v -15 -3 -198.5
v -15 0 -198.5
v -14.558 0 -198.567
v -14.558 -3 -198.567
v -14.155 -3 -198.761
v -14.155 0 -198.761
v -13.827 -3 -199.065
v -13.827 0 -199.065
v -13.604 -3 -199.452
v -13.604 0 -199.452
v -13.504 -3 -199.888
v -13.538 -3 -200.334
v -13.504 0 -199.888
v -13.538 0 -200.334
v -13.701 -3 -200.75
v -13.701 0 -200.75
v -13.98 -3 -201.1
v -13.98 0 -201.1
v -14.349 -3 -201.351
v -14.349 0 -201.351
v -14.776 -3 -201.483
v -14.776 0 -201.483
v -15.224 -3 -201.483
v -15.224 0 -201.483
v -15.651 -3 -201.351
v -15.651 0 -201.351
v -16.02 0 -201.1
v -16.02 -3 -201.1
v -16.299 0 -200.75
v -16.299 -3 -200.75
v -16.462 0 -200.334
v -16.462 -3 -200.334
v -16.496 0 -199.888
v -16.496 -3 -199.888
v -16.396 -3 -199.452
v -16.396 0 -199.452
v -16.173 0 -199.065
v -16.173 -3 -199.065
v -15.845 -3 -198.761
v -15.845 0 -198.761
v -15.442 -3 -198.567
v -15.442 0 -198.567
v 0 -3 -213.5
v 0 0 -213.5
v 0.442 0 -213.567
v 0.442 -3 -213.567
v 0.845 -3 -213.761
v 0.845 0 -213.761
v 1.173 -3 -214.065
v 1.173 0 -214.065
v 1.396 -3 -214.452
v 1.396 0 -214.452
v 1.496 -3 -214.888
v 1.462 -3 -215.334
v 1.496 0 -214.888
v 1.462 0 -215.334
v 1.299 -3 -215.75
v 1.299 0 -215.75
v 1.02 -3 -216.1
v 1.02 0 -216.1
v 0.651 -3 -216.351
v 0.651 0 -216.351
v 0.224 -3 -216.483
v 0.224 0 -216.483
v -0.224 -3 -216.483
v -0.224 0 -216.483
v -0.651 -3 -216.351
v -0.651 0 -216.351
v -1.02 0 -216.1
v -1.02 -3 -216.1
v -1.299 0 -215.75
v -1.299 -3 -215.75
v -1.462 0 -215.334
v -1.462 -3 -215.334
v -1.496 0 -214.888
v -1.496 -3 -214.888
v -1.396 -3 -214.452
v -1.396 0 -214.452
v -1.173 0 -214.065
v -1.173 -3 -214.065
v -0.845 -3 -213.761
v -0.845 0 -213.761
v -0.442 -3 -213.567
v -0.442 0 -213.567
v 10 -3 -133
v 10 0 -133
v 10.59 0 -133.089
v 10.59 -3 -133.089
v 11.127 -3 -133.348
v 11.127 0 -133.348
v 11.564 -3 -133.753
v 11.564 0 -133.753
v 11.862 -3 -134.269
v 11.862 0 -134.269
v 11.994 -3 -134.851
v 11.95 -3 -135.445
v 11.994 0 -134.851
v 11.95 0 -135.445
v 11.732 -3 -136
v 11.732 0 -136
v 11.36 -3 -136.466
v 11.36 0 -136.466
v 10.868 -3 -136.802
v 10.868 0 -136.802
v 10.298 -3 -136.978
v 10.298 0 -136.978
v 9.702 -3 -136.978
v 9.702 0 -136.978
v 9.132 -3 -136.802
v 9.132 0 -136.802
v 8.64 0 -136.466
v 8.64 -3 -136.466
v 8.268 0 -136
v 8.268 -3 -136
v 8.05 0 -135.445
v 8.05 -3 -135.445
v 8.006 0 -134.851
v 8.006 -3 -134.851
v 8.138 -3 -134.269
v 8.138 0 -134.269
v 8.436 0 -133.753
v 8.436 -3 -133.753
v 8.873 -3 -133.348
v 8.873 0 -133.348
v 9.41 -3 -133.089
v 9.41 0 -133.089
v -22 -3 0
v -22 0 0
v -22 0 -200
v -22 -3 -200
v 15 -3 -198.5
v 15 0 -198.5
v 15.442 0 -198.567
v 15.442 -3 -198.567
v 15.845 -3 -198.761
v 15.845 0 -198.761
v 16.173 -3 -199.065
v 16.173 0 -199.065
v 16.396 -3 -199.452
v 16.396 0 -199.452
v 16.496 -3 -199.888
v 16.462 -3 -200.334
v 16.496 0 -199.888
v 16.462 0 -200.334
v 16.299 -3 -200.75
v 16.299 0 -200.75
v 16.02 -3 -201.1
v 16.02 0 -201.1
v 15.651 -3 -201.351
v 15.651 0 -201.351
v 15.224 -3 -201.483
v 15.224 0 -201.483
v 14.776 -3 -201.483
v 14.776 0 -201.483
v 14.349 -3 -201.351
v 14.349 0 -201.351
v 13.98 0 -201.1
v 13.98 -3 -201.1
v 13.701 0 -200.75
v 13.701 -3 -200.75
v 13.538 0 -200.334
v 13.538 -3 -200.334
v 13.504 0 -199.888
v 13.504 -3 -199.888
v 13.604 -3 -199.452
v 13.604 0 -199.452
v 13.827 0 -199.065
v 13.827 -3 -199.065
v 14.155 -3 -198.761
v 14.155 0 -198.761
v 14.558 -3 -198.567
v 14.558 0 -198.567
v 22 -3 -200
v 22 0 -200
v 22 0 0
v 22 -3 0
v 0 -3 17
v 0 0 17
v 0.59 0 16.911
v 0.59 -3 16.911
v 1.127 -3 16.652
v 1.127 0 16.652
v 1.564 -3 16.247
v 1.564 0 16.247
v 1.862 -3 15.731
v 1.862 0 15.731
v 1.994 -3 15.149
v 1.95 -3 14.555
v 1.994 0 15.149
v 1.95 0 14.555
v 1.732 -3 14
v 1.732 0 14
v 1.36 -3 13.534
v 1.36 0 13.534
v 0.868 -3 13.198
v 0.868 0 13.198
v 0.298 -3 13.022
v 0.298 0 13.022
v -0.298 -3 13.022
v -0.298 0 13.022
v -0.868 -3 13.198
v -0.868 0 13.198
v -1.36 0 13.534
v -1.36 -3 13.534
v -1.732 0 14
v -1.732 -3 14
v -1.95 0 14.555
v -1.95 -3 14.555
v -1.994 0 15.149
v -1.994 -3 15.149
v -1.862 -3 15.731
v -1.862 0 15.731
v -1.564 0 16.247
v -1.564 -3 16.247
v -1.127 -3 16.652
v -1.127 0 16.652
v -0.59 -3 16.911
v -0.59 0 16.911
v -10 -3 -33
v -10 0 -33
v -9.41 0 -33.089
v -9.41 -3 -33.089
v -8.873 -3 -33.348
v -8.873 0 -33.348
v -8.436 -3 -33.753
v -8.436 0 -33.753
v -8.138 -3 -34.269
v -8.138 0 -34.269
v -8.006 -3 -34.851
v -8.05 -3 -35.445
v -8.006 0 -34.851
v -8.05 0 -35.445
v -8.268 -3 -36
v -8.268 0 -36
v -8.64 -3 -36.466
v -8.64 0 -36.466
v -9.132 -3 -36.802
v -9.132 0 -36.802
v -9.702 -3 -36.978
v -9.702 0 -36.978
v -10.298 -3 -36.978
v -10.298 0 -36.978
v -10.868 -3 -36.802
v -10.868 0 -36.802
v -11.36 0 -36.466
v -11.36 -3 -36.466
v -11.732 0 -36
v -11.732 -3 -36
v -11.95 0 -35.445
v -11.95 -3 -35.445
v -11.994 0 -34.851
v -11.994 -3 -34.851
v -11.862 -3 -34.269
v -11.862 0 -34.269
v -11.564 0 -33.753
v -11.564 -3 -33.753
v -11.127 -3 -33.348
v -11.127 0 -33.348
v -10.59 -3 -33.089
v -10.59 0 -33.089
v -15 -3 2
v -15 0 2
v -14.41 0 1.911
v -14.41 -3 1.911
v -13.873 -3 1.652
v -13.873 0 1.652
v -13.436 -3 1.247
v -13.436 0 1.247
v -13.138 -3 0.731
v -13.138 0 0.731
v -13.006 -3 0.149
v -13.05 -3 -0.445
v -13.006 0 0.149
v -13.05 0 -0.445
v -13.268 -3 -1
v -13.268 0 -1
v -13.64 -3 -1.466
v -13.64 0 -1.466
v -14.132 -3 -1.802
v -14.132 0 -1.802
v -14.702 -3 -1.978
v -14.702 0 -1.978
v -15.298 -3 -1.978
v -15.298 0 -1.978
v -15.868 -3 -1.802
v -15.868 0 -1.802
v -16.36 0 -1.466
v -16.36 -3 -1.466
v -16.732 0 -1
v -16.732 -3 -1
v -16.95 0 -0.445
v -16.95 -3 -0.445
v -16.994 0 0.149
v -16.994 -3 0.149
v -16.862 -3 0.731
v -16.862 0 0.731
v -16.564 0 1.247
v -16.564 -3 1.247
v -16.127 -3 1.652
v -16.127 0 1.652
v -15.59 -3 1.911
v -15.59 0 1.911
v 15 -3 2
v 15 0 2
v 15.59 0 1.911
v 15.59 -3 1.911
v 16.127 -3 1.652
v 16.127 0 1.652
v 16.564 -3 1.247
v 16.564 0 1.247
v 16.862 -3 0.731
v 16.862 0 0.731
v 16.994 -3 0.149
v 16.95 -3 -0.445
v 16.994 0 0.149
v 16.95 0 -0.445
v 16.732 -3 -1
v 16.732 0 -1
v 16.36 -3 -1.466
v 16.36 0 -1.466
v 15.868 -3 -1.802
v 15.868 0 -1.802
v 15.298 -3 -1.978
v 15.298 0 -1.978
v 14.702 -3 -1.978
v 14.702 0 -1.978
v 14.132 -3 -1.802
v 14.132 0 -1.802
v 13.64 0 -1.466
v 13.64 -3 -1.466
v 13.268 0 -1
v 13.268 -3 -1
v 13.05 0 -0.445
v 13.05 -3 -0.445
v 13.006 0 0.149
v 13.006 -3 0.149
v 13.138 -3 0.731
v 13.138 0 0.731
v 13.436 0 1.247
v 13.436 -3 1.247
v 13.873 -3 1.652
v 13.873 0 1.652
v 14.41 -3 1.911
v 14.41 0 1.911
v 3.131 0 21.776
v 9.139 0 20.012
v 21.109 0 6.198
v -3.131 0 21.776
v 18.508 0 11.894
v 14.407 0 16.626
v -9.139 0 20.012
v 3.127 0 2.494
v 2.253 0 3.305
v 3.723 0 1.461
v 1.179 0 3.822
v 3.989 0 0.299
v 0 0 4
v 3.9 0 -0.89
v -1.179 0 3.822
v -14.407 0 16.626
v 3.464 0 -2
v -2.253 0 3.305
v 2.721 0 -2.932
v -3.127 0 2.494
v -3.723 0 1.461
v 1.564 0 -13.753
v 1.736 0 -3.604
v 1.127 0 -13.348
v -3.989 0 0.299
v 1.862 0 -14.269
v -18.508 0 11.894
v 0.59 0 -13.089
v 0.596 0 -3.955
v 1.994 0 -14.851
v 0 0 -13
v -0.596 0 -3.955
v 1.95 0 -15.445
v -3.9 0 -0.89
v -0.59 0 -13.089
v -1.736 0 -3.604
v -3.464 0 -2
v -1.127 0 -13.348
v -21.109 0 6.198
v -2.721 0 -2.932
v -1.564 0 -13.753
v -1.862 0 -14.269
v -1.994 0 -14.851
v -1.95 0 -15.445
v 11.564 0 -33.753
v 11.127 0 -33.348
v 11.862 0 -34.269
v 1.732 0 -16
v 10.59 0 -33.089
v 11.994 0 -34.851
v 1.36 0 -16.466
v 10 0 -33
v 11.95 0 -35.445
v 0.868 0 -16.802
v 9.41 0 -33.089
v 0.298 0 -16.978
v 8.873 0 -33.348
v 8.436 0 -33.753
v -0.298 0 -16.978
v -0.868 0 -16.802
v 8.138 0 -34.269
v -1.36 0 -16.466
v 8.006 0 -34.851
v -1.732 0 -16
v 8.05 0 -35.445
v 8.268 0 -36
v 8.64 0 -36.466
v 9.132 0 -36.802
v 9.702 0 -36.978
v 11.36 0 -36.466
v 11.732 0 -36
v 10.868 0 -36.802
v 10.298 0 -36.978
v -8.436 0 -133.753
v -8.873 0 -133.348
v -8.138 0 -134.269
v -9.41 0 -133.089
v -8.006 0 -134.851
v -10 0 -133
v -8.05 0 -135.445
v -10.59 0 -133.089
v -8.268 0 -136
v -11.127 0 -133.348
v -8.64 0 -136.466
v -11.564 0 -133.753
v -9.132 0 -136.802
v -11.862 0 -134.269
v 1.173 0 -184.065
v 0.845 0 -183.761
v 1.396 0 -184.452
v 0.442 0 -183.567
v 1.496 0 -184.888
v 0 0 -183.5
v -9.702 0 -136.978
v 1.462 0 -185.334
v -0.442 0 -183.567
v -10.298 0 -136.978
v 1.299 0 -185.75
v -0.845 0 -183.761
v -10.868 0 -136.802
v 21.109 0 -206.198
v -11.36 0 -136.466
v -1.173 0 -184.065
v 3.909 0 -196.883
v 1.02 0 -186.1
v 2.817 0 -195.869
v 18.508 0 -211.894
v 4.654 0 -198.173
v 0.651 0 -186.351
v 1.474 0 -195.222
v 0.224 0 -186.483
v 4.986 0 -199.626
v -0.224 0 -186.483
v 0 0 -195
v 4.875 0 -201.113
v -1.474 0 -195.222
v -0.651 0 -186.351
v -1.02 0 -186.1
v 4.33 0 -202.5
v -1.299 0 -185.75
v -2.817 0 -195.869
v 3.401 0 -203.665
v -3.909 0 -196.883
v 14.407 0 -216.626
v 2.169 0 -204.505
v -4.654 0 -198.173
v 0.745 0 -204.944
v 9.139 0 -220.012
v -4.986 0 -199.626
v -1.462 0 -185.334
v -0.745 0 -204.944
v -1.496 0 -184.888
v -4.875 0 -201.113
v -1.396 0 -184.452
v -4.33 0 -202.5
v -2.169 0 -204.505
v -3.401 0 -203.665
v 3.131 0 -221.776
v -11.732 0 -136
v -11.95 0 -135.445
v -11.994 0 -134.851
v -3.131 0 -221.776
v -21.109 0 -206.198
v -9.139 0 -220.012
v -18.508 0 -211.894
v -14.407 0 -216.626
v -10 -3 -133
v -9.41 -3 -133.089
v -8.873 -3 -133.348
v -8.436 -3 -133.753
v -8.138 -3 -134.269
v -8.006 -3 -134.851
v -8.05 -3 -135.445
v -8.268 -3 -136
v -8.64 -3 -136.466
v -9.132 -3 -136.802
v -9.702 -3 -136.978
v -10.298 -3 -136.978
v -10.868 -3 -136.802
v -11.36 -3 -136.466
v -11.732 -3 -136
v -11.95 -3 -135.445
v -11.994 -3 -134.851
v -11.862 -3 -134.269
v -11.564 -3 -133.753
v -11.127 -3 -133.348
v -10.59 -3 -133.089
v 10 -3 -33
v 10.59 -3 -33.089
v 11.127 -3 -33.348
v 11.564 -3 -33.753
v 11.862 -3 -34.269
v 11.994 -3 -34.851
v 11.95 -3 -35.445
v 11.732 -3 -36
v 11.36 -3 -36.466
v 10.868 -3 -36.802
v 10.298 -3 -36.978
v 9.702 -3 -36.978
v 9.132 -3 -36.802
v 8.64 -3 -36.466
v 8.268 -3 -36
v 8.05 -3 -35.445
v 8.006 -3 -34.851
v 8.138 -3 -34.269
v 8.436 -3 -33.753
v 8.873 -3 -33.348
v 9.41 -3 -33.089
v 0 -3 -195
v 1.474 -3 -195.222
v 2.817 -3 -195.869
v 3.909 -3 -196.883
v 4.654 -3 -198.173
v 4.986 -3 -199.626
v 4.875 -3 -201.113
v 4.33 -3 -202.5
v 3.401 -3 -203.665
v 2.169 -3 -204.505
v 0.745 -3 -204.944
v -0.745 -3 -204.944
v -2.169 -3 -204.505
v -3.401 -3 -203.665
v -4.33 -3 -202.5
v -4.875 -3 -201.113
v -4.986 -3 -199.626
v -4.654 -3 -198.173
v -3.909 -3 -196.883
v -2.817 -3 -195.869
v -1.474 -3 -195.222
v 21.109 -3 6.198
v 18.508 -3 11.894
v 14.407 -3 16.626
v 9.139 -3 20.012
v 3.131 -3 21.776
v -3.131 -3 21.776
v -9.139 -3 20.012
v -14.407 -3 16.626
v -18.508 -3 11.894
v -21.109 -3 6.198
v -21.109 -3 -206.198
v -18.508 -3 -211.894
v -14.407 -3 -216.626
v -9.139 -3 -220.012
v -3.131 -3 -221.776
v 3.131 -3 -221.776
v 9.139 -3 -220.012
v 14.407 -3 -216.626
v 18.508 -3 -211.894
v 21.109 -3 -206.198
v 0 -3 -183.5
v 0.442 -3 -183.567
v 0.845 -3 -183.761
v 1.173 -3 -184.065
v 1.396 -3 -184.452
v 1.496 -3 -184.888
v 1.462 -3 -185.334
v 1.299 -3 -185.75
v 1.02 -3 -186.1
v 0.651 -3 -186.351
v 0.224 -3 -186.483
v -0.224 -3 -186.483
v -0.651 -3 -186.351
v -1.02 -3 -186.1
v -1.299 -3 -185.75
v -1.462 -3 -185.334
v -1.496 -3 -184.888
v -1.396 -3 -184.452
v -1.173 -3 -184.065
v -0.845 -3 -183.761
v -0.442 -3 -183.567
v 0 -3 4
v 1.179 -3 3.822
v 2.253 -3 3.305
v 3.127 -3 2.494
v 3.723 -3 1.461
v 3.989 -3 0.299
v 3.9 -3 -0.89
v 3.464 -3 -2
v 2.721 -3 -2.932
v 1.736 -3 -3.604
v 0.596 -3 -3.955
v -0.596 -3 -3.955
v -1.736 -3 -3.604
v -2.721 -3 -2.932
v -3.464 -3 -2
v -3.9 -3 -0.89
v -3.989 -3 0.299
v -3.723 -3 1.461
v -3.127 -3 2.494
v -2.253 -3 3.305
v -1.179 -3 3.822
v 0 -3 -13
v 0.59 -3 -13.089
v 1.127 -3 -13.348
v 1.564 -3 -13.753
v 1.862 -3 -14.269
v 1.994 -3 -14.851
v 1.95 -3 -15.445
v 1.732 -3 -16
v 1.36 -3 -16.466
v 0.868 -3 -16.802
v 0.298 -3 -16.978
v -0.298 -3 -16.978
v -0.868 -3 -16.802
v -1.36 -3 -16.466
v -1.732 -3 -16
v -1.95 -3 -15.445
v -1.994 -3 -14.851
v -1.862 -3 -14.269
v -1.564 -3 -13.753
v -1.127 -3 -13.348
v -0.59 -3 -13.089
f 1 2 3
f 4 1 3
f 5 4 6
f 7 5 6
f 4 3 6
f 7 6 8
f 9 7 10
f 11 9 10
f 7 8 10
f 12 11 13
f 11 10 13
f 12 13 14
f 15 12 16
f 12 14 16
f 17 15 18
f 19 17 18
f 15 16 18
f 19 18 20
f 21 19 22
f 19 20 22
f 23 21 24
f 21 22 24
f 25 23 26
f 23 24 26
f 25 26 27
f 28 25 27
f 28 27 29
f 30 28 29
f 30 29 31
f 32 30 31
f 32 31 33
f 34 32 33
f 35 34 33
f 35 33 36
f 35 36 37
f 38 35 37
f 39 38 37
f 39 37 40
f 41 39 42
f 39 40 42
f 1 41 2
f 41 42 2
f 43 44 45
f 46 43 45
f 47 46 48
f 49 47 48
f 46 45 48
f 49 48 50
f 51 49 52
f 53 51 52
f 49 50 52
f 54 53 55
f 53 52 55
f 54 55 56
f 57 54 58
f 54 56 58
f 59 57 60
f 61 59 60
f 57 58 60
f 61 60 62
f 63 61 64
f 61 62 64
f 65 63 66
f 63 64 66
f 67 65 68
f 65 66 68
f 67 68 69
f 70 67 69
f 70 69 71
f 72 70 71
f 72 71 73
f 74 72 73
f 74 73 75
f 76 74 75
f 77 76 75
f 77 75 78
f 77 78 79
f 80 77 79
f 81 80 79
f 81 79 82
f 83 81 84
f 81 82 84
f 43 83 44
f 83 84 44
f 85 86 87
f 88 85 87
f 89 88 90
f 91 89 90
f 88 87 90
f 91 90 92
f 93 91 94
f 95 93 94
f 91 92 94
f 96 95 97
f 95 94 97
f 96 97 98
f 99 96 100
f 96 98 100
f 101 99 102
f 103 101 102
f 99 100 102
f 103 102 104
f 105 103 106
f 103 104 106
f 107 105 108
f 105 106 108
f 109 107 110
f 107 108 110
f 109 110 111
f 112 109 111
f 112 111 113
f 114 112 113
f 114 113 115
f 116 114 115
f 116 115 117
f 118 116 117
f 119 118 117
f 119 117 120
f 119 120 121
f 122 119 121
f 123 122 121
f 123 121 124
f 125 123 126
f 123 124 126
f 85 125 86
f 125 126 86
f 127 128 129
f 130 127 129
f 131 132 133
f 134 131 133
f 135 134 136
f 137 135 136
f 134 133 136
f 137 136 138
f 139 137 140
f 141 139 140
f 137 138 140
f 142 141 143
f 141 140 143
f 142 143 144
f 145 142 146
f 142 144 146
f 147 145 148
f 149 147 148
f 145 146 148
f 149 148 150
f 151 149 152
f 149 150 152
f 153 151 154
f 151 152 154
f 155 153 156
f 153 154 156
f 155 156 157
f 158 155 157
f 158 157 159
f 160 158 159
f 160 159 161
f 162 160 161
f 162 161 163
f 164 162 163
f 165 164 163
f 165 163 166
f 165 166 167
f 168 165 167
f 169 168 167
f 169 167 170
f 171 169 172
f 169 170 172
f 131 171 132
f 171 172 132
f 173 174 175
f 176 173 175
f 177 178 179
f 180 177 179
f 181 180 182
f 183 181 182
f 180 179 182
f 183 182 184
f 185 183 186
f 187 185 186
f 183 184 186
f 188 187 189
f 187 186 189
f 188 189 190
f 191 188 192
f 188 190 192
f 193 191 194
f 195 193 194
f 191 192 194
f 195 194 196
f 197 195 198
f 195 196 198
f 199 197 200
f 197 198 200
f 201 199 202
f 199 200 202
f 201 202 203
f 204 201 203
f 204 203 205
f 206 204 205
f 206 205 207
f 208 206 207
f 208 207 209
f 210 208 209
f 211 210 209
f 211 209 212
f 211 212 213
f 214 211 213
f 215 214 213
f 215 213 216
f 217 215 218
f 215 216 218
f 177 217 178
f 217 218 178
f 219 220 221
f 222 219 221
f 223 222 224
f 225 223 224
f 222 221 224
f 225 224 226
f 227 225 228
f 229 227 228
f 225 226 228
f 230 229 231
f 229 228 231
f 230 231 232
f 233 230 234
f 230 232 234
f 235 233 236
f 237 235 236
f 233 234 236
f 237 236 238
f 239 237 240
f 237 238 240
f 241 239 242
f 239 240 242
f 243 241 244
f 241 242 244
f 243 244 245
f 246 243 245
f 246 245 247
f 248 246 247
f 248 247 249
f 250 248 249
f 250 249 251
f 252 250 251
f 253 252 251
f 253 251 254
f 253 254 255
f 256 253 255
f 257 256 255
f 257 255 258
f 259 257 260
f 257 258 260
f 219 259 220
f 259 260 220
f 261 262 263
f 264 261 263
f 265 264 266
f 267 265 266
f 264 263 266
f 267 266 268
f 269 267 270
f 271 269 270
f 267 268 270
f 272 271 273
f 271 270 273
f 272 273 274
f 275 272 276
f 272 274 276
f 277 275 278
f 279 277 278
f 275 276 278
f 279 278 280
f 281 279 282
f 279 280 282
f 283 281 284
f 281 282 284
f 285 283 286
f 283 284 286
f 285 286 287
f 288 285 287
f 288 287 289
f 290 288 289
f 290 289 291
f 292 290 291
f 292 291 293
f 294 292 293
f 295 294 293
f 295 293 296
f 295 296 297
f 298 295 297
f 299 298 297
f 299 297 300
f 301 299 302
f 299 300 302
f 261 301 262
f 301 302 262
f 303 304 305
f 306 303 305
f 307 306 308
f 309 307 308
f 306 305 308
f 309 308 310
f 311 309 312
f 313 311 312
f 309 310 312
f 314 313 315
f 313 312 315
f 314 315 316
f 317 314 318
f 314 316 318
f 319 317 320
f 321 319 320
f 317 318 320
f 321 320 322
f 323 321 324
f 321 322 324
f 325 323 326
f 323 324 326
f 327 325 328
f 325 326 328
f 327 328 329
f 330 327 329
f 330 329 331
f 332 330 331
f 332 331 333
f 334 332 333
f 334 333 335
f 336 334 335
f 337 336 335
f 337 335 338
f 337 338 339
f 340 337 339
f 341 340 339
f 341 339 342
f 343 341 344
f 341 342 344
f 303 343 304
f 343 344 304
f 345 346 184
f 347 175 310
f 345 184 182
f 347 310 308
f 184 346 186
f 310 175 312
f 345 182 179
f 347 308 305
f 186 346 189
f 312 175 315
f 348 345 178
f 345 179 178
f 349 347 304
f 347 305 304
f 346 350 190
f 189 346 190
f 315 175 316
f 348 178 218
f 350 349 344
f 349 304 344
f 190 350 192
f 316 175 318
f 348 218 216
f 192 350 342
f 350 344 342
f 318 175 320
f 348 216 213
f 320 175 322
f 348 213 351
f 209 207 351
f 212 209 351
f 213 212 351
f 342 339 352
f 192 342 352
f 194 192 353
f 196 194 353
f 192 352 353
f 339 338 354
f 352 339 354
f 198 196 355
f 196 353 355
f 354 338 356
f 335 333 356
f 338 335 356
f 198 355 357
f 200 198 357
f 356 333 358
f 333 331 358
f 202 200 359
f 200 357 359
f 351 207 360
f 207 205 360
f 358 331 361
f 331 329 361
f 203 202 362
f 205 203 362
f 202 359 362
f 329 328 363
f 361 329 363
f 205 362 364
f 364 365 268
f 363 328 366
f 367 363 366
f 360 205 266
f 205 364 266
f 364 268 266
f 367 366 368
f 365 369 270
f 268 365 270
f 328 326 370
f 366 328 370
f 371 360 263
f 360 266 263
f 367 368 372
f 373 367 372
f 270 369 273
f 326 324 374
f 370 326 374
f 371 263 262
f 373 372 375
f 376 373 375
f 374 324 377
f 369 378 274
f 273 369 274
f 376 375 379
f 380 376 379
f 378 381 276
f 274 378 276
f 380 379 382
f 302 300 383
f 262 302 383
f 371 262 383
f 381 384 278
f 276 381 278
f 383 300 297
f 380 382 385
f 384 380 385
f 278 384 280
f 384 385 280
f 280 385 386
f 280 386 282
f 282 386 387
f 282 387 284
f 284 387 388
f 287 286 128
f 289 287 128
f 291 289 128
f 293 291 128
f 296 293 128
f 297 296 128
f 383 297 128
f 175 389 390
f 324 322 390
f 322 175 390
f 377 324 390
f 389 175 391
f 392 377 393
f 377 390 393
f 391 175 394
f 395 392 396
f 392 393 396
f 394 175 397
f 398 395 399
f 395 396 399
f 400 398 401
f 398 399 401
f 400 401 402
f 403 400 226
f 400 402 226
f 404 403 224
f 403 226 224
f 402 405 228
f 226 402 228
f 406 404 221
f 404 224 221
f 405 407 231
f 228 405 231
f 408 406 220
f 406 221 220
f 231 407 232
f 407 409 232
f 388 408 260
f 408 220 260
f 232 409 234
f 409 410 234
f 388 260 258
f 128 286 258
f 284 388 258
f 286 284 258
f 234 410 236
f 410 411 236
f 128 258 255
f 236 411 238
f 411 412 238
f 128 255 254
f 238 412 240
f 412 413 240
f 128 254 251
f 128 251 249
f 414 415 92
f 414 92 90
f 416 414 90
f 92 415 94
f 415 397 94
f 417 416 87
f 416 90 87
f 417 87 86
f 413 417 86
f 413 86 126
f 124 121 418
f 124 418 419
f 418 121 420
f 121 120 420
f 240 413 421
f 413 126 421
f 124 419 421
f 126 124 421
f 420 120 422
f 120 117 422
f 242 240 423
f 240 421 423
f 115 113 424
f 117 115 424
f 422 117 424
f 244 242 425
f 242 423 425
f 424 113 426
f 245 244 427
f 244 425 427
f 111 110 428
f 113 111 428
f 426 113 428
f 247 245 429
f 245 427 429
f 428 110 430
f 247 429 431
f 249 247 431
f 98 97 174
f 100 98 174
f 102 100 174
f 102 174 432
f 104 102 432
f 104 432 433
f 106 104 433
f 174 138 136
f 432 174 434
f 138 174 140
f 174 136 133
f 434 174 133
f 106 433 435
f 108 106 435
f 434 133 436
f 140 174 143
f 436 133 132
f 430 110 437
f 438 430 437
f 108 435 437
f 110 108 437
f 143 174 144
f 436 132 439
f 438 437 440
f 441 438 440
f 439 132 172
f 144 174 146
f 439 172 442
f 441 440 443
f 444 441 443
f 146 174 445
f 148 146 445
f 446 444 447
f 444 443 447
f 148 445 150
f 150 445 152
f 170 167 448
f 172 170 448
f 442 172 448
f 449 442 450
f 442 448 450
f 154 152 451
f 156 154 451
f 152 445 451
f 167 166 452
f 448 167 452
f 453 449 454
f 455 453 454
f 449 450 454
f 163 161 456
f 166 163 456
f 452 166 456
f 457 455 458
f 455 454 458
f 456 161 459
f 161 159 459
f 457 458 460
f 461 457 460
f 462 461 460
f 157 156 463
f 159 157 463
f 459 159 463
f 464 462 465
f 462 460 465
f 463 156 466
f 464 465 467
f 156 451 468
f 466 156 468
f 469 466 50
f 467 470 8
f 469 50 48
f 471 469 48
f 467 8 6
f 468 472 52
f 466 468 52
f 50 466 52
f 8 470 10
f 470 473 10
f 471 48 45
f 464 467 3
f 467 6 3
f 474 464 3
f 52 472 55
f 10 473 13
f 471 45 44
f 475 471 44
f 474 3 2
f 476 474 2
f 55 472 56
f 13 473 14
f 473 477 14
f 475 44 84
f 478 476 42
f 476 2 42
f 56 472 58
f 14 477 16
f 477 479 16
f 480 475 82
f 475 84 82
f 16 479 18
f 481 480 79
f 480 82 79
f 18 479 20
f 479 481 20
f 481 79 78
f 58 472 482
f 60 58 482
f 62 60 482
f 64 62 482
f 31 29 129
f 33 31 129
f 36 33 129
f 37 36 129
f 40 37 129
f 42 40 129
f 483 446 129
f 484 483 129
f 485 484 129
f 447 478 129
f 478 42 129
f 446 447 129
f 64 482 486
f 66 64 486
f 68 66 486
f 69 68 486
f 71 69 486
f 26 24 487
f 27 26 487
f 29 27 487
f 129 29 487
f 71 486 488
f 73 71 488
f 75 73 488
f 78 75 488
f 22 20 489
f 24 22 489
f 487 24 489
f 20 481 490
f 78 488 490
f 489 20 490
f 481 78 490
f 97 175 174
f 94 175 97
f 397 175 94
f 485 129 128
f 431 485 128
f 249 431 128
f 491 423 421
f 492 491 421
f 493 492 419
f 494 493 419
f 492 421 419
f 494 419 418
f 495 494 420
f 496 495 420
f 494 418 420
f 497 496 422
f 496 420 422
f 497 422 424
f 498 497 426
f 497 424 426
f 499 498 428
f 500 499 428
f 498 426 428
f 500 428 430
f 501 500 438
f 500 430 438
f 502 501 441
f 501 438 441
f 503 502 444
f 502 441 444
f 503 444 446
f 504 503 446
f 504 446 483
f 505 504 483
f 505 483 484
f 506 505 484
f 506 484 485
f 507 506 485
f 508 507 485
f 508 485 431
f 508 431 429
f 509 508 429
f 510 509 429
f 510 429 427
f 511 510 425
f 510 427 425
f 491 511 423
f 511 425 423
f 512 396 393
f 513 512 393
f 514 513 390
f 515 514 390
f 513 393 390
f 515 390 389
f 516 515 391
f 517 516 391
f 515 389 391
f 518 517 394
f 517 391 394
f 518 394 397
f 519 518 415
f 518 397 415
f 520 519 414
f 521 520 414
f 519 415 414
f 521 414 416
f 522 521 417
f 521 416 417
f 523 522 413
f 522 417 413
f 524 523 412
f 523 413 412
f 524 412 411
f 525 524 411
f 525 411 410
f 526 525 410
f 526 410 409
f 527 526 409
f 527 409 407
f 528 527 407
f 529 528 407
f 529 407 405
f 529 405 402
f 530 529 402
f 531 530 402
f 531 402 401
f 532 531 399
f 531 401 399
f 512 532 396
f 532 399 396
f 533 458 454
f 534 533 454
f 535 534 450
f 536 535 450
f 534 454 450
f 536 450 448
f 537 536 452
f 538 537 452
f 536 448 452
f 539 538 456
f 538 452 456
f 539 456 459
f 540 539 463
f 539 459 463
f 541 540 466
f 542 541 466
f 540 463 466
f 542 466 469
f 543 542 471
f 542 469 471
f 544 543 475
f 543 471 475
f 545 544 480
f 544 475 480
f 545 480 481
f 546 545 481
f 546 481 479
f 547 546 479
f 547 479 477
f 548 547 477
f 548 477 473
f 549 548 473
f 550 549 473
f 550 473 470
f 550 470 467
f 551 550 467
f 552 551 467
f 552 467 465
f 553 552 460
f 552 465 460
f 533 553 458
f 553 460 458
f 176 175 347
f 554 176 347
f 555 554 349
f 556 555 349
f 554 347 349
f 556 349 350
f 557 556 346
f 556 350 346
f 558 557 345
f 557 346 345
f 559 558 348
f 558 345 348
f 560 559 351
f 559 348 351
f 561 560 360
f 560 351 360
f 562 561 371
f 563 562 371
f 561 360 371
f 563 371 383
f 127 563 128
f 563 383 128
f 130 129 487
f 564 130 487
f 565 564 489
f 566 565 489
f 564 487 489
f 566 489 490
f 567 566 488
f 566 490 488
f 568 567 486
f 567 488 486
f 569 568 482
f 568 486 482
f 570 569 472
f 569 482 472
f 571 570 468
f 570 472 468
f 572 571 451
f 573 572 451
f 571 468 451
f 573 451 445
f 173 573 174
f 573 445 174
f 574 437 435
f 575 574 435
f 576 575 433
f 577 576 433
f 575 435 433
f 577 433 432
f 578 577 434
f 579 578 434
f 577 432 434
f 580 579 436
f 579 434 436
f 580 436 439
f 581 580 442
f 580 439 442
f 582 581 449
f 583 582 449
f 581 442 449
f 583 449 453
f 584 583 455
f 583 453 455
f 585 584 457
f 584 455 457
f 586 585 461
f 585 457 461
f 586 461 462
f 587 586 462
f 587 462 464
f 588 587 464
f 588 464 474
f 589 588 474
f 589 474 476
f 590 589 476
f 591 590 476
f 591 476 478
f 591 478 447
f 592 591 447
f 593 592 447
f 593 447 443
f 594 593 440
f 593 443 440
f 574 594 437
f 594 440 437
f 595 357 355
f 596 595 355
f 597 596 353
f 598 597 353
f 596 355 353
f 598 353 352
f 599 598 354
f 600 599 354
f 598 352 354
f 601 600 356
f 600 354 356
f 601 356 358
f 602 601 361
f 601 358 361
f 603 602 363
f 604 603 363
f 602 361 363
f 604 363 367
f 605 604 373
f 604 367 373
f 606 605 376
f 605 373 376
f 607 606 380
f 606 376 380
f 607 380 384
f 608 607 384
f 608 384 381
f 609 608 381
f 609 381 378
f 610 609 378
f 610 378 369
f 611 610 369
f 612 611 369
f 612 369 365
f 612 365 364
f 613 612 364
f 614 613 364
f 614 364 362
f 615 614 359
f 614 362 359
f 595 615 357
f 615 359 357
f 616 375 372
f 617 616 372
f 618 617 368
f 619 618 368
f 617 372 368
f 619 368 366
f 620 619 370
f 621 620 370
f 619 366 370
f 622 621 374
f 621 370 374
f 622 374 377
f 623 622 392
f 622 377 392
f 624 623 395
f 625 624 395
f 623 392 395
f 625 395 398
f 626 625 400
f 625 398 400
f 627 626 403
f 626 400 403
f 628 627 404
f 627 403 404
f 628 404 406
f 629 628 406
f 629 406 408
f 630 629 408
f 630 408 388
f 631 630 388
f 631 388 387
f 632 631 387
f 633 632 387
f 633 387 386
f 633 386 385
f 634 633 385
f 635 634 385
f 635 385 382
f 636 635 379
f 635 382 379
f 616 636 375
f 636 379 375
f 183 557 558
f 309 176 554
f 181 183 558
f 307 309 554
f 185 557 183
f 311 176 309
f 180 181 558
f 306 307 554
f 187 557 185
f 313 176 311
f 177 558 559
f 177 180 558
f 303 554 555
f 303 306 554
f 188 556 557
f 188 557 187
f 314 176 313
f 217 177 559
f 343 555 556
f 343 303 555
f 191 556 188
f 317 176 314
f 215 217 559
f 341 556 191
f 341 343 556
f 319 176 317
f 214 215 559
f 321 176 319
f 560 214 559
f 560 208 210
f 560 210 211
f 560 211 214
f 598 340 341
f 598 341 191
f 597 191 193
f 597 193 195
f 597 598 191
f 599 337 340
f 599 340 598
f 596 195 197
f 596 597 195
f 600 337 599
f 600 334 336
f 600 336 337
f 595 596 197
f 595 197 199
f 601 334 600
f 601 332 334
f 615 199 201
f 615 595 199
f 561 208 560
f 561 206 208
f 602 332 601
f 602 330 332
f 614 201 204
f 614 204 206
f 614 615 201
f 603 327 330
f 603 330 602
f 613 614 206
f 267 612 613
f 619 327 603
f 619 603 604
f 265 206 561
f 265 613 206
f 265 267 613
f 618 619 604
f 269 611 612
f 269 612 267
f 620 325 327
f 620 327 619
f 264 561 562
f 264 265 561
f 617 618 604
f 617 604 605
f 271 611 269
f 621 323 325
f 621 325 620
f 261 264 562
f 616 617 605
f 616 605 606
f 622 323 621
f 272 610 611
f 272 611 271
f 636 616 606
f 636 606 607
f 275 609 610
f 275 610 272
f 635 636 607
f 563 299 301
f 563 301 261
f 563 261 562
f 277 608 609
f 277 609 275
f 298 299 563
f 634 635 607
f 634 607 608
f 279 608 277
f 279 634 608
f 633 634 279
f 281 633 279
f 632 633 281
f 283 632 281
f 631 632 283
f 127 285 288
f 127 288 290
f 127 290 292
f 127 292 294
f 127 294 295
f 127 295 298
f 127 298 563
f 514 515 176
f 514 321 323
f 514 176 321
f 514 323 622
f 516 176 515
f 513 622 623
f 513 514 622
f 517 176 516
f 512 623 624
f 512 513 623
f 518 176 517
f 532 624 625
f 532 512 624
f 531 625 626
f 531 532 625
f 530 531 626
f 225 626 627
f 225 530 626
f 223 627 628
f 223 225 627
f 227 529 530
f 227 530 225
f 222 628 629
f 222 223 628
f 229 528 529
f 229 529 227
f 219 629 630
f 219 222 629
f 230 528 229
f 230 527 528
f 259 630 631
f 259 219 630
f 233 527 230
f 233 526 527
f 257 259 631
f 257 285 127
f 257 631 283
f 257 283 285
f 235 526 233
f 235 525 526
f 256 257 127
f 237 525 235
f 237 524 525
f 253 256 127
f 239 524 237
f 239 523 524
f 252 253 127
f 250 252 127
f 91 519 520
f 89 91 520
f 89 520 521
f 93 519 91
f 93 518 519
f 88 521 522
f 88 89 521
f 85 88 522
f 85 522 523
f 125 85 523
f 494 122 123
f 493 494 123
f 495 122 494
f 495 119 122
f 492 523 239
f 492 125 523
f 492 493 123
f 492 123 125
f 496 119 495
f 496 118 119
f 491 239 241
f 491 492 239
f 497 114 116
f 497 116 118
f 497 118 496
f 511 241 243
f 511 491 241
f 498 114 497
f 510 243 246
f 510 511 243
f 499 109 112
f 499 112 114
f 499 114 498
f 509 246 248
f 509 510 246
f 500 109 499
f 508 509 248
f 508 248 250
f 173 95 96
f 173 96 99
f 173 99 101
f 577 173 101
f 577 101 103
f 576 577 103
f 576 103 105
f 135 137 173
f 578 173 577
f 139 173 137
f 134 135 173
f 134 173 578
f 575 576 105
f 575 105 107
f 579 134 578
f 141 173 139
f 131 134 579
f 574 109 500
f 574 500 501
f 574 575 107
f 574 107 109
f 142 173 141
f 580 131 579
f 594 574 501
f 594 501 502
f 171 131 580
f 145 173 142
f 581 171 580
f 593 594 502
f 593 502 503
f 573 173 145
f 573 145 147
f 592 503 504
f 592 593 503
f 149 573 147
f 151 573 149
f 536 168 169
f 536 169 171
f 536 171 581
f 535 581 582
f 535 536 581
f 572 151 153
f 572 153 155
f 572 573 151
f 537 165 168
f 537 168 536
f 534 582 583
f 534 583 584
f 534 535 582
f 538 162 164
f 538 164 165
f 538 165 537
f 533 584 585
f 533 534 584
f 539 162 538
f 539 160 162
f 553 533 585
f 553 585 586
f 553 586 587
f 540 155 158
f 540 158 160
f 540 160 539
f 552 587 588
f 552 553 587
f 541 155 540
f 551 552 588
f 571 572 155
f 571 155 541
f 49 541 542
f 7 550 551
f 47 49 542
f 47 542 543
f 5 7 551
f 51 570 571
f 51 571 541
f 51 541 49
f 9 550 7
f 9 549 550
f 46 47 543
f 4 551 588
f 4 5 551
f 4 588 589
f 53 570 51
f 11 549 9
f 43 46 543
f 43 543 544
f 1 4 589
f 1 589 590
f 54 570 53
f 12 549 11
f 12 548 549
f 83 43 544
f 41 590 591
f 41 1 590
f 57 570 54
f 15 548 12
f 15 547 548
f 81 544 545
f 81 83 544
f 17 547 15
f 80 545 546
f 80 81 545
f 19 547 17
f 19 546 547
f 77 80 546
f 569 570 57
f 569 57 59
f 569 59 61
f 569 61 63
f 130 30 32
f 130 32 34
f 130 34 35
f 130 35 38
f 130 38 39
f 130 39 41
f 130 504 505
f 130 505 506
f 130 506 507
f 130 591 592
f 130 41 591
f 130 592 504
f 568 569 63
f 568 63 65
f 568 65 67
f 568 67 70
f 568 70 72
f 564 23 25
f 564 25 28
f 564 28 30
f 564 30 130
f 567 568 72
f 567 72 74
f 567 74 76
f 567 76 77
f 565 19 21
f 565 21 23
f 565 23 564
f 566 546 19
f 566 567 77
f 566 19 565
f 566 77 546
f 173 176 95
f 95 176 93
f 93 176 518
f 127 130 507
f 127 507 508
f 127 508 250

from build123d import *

# Parameters (mm, degrees)
SKETCH_1_R             = 4
SKETCH_1_R_2           = 2
SKETCH_1_R_3           = 5
SKETCH_1_R_4           = 1.5
SM_BASE_FLANGE_1_DEPTH = 3


# Sheet-metal steps are written as plain solids
with BuildPart() as part:
    # Sketch 1 → 基体-法兰1 (new body)
    with BuildSketch(Plane(origin=(0, 0, 0), x_dir=(1, 0, 0), z_dir=(0, 1, 0))):
        with BuildLine():
            Line((22, 200), (22, 0))
            ThreePointArc((22, 0), (0, -22), (-22, 0))
            Line((-22, 0), (-22, 200))
            ThreePointArc((-22, 200), (0, 222), (22, 200))
        make_face()
        with Locations(Location((0, 0, 0), (0, 0, 270))):
            Circle(SKETCH_1_R, mode=Mode.SUBTRACT)
        with Locations(Location((-10, 35, 0), (0, 0, 270))):
            Circle(SKETCH_1_R_2, mode=Mode.SUBTRACT)
        with Locations(Location((10, 35, 0), (0, 0, 270))):
            Circle(SKETCH_1_R_2, mode=Mode.SUBTRACT)
        with Locations(Location((-10, 135, 0), (0, 0, 270))):
            Circle(SKETCH_1_R_2, mode=Mode.SUBTRACT)
        with Locations(Location((10, 135, 0), (0, 0, 270))):
            Circle(SKETCH_1_R_2, mode=Mode.SUBTRACT)
        with Locations(Location((0, 200, 0), (0, 0, 270))):
            Circle(SKETCH_1_R_3, mode=Mode.SUBTRACT)
        with Locations(Location((0, 215, 0), (0, 0, 270))):
            Circle(SKETCH_1_R_4, mode=Mode.SUBTRACT)
        with Locations(Location((15, 200, 0), (0, 0, 270))):
            Circle(SKETCH_1_R_4, mode=Mode.SUBTRACT)
        with Locations(Location((0, 185, 0), (0, 0, 270))):
            Circle(SKETCH_1_R_4, mode=Mode.SUBTRACT)
        with Locations(Location((-15, 200, 0), (0, 0, 270))):
            Circle(SKETCH_1_R_4, mode=Mode.SUBTRACT)
        with Locations(Location((0, 15, 0), (0, 0, 270))):
            Circle(SKETCH_1_R_2, mode=Mode.SUBTRACT)
        with Locations(Location((15, 0, 0), (0, 0, 270))):
            Circle(SKETCH_1_R_2, mode=Mode.SUBTRACT)
        with Locations(Location((0, -15, 0), (0, 0, 270))):
            Circle(SKETCH_1_R_2, mode=Mode.SUBTRACT)
        with Locations(Location((-15, 0, 0), (0, 0, 270))):
            Circle(SKETCH_1_R_2, mode=Mode.SUBTRACT)
    extrude(amount=-SM_BASE_FLANGE_1_DEPTH)


solid = part.part
